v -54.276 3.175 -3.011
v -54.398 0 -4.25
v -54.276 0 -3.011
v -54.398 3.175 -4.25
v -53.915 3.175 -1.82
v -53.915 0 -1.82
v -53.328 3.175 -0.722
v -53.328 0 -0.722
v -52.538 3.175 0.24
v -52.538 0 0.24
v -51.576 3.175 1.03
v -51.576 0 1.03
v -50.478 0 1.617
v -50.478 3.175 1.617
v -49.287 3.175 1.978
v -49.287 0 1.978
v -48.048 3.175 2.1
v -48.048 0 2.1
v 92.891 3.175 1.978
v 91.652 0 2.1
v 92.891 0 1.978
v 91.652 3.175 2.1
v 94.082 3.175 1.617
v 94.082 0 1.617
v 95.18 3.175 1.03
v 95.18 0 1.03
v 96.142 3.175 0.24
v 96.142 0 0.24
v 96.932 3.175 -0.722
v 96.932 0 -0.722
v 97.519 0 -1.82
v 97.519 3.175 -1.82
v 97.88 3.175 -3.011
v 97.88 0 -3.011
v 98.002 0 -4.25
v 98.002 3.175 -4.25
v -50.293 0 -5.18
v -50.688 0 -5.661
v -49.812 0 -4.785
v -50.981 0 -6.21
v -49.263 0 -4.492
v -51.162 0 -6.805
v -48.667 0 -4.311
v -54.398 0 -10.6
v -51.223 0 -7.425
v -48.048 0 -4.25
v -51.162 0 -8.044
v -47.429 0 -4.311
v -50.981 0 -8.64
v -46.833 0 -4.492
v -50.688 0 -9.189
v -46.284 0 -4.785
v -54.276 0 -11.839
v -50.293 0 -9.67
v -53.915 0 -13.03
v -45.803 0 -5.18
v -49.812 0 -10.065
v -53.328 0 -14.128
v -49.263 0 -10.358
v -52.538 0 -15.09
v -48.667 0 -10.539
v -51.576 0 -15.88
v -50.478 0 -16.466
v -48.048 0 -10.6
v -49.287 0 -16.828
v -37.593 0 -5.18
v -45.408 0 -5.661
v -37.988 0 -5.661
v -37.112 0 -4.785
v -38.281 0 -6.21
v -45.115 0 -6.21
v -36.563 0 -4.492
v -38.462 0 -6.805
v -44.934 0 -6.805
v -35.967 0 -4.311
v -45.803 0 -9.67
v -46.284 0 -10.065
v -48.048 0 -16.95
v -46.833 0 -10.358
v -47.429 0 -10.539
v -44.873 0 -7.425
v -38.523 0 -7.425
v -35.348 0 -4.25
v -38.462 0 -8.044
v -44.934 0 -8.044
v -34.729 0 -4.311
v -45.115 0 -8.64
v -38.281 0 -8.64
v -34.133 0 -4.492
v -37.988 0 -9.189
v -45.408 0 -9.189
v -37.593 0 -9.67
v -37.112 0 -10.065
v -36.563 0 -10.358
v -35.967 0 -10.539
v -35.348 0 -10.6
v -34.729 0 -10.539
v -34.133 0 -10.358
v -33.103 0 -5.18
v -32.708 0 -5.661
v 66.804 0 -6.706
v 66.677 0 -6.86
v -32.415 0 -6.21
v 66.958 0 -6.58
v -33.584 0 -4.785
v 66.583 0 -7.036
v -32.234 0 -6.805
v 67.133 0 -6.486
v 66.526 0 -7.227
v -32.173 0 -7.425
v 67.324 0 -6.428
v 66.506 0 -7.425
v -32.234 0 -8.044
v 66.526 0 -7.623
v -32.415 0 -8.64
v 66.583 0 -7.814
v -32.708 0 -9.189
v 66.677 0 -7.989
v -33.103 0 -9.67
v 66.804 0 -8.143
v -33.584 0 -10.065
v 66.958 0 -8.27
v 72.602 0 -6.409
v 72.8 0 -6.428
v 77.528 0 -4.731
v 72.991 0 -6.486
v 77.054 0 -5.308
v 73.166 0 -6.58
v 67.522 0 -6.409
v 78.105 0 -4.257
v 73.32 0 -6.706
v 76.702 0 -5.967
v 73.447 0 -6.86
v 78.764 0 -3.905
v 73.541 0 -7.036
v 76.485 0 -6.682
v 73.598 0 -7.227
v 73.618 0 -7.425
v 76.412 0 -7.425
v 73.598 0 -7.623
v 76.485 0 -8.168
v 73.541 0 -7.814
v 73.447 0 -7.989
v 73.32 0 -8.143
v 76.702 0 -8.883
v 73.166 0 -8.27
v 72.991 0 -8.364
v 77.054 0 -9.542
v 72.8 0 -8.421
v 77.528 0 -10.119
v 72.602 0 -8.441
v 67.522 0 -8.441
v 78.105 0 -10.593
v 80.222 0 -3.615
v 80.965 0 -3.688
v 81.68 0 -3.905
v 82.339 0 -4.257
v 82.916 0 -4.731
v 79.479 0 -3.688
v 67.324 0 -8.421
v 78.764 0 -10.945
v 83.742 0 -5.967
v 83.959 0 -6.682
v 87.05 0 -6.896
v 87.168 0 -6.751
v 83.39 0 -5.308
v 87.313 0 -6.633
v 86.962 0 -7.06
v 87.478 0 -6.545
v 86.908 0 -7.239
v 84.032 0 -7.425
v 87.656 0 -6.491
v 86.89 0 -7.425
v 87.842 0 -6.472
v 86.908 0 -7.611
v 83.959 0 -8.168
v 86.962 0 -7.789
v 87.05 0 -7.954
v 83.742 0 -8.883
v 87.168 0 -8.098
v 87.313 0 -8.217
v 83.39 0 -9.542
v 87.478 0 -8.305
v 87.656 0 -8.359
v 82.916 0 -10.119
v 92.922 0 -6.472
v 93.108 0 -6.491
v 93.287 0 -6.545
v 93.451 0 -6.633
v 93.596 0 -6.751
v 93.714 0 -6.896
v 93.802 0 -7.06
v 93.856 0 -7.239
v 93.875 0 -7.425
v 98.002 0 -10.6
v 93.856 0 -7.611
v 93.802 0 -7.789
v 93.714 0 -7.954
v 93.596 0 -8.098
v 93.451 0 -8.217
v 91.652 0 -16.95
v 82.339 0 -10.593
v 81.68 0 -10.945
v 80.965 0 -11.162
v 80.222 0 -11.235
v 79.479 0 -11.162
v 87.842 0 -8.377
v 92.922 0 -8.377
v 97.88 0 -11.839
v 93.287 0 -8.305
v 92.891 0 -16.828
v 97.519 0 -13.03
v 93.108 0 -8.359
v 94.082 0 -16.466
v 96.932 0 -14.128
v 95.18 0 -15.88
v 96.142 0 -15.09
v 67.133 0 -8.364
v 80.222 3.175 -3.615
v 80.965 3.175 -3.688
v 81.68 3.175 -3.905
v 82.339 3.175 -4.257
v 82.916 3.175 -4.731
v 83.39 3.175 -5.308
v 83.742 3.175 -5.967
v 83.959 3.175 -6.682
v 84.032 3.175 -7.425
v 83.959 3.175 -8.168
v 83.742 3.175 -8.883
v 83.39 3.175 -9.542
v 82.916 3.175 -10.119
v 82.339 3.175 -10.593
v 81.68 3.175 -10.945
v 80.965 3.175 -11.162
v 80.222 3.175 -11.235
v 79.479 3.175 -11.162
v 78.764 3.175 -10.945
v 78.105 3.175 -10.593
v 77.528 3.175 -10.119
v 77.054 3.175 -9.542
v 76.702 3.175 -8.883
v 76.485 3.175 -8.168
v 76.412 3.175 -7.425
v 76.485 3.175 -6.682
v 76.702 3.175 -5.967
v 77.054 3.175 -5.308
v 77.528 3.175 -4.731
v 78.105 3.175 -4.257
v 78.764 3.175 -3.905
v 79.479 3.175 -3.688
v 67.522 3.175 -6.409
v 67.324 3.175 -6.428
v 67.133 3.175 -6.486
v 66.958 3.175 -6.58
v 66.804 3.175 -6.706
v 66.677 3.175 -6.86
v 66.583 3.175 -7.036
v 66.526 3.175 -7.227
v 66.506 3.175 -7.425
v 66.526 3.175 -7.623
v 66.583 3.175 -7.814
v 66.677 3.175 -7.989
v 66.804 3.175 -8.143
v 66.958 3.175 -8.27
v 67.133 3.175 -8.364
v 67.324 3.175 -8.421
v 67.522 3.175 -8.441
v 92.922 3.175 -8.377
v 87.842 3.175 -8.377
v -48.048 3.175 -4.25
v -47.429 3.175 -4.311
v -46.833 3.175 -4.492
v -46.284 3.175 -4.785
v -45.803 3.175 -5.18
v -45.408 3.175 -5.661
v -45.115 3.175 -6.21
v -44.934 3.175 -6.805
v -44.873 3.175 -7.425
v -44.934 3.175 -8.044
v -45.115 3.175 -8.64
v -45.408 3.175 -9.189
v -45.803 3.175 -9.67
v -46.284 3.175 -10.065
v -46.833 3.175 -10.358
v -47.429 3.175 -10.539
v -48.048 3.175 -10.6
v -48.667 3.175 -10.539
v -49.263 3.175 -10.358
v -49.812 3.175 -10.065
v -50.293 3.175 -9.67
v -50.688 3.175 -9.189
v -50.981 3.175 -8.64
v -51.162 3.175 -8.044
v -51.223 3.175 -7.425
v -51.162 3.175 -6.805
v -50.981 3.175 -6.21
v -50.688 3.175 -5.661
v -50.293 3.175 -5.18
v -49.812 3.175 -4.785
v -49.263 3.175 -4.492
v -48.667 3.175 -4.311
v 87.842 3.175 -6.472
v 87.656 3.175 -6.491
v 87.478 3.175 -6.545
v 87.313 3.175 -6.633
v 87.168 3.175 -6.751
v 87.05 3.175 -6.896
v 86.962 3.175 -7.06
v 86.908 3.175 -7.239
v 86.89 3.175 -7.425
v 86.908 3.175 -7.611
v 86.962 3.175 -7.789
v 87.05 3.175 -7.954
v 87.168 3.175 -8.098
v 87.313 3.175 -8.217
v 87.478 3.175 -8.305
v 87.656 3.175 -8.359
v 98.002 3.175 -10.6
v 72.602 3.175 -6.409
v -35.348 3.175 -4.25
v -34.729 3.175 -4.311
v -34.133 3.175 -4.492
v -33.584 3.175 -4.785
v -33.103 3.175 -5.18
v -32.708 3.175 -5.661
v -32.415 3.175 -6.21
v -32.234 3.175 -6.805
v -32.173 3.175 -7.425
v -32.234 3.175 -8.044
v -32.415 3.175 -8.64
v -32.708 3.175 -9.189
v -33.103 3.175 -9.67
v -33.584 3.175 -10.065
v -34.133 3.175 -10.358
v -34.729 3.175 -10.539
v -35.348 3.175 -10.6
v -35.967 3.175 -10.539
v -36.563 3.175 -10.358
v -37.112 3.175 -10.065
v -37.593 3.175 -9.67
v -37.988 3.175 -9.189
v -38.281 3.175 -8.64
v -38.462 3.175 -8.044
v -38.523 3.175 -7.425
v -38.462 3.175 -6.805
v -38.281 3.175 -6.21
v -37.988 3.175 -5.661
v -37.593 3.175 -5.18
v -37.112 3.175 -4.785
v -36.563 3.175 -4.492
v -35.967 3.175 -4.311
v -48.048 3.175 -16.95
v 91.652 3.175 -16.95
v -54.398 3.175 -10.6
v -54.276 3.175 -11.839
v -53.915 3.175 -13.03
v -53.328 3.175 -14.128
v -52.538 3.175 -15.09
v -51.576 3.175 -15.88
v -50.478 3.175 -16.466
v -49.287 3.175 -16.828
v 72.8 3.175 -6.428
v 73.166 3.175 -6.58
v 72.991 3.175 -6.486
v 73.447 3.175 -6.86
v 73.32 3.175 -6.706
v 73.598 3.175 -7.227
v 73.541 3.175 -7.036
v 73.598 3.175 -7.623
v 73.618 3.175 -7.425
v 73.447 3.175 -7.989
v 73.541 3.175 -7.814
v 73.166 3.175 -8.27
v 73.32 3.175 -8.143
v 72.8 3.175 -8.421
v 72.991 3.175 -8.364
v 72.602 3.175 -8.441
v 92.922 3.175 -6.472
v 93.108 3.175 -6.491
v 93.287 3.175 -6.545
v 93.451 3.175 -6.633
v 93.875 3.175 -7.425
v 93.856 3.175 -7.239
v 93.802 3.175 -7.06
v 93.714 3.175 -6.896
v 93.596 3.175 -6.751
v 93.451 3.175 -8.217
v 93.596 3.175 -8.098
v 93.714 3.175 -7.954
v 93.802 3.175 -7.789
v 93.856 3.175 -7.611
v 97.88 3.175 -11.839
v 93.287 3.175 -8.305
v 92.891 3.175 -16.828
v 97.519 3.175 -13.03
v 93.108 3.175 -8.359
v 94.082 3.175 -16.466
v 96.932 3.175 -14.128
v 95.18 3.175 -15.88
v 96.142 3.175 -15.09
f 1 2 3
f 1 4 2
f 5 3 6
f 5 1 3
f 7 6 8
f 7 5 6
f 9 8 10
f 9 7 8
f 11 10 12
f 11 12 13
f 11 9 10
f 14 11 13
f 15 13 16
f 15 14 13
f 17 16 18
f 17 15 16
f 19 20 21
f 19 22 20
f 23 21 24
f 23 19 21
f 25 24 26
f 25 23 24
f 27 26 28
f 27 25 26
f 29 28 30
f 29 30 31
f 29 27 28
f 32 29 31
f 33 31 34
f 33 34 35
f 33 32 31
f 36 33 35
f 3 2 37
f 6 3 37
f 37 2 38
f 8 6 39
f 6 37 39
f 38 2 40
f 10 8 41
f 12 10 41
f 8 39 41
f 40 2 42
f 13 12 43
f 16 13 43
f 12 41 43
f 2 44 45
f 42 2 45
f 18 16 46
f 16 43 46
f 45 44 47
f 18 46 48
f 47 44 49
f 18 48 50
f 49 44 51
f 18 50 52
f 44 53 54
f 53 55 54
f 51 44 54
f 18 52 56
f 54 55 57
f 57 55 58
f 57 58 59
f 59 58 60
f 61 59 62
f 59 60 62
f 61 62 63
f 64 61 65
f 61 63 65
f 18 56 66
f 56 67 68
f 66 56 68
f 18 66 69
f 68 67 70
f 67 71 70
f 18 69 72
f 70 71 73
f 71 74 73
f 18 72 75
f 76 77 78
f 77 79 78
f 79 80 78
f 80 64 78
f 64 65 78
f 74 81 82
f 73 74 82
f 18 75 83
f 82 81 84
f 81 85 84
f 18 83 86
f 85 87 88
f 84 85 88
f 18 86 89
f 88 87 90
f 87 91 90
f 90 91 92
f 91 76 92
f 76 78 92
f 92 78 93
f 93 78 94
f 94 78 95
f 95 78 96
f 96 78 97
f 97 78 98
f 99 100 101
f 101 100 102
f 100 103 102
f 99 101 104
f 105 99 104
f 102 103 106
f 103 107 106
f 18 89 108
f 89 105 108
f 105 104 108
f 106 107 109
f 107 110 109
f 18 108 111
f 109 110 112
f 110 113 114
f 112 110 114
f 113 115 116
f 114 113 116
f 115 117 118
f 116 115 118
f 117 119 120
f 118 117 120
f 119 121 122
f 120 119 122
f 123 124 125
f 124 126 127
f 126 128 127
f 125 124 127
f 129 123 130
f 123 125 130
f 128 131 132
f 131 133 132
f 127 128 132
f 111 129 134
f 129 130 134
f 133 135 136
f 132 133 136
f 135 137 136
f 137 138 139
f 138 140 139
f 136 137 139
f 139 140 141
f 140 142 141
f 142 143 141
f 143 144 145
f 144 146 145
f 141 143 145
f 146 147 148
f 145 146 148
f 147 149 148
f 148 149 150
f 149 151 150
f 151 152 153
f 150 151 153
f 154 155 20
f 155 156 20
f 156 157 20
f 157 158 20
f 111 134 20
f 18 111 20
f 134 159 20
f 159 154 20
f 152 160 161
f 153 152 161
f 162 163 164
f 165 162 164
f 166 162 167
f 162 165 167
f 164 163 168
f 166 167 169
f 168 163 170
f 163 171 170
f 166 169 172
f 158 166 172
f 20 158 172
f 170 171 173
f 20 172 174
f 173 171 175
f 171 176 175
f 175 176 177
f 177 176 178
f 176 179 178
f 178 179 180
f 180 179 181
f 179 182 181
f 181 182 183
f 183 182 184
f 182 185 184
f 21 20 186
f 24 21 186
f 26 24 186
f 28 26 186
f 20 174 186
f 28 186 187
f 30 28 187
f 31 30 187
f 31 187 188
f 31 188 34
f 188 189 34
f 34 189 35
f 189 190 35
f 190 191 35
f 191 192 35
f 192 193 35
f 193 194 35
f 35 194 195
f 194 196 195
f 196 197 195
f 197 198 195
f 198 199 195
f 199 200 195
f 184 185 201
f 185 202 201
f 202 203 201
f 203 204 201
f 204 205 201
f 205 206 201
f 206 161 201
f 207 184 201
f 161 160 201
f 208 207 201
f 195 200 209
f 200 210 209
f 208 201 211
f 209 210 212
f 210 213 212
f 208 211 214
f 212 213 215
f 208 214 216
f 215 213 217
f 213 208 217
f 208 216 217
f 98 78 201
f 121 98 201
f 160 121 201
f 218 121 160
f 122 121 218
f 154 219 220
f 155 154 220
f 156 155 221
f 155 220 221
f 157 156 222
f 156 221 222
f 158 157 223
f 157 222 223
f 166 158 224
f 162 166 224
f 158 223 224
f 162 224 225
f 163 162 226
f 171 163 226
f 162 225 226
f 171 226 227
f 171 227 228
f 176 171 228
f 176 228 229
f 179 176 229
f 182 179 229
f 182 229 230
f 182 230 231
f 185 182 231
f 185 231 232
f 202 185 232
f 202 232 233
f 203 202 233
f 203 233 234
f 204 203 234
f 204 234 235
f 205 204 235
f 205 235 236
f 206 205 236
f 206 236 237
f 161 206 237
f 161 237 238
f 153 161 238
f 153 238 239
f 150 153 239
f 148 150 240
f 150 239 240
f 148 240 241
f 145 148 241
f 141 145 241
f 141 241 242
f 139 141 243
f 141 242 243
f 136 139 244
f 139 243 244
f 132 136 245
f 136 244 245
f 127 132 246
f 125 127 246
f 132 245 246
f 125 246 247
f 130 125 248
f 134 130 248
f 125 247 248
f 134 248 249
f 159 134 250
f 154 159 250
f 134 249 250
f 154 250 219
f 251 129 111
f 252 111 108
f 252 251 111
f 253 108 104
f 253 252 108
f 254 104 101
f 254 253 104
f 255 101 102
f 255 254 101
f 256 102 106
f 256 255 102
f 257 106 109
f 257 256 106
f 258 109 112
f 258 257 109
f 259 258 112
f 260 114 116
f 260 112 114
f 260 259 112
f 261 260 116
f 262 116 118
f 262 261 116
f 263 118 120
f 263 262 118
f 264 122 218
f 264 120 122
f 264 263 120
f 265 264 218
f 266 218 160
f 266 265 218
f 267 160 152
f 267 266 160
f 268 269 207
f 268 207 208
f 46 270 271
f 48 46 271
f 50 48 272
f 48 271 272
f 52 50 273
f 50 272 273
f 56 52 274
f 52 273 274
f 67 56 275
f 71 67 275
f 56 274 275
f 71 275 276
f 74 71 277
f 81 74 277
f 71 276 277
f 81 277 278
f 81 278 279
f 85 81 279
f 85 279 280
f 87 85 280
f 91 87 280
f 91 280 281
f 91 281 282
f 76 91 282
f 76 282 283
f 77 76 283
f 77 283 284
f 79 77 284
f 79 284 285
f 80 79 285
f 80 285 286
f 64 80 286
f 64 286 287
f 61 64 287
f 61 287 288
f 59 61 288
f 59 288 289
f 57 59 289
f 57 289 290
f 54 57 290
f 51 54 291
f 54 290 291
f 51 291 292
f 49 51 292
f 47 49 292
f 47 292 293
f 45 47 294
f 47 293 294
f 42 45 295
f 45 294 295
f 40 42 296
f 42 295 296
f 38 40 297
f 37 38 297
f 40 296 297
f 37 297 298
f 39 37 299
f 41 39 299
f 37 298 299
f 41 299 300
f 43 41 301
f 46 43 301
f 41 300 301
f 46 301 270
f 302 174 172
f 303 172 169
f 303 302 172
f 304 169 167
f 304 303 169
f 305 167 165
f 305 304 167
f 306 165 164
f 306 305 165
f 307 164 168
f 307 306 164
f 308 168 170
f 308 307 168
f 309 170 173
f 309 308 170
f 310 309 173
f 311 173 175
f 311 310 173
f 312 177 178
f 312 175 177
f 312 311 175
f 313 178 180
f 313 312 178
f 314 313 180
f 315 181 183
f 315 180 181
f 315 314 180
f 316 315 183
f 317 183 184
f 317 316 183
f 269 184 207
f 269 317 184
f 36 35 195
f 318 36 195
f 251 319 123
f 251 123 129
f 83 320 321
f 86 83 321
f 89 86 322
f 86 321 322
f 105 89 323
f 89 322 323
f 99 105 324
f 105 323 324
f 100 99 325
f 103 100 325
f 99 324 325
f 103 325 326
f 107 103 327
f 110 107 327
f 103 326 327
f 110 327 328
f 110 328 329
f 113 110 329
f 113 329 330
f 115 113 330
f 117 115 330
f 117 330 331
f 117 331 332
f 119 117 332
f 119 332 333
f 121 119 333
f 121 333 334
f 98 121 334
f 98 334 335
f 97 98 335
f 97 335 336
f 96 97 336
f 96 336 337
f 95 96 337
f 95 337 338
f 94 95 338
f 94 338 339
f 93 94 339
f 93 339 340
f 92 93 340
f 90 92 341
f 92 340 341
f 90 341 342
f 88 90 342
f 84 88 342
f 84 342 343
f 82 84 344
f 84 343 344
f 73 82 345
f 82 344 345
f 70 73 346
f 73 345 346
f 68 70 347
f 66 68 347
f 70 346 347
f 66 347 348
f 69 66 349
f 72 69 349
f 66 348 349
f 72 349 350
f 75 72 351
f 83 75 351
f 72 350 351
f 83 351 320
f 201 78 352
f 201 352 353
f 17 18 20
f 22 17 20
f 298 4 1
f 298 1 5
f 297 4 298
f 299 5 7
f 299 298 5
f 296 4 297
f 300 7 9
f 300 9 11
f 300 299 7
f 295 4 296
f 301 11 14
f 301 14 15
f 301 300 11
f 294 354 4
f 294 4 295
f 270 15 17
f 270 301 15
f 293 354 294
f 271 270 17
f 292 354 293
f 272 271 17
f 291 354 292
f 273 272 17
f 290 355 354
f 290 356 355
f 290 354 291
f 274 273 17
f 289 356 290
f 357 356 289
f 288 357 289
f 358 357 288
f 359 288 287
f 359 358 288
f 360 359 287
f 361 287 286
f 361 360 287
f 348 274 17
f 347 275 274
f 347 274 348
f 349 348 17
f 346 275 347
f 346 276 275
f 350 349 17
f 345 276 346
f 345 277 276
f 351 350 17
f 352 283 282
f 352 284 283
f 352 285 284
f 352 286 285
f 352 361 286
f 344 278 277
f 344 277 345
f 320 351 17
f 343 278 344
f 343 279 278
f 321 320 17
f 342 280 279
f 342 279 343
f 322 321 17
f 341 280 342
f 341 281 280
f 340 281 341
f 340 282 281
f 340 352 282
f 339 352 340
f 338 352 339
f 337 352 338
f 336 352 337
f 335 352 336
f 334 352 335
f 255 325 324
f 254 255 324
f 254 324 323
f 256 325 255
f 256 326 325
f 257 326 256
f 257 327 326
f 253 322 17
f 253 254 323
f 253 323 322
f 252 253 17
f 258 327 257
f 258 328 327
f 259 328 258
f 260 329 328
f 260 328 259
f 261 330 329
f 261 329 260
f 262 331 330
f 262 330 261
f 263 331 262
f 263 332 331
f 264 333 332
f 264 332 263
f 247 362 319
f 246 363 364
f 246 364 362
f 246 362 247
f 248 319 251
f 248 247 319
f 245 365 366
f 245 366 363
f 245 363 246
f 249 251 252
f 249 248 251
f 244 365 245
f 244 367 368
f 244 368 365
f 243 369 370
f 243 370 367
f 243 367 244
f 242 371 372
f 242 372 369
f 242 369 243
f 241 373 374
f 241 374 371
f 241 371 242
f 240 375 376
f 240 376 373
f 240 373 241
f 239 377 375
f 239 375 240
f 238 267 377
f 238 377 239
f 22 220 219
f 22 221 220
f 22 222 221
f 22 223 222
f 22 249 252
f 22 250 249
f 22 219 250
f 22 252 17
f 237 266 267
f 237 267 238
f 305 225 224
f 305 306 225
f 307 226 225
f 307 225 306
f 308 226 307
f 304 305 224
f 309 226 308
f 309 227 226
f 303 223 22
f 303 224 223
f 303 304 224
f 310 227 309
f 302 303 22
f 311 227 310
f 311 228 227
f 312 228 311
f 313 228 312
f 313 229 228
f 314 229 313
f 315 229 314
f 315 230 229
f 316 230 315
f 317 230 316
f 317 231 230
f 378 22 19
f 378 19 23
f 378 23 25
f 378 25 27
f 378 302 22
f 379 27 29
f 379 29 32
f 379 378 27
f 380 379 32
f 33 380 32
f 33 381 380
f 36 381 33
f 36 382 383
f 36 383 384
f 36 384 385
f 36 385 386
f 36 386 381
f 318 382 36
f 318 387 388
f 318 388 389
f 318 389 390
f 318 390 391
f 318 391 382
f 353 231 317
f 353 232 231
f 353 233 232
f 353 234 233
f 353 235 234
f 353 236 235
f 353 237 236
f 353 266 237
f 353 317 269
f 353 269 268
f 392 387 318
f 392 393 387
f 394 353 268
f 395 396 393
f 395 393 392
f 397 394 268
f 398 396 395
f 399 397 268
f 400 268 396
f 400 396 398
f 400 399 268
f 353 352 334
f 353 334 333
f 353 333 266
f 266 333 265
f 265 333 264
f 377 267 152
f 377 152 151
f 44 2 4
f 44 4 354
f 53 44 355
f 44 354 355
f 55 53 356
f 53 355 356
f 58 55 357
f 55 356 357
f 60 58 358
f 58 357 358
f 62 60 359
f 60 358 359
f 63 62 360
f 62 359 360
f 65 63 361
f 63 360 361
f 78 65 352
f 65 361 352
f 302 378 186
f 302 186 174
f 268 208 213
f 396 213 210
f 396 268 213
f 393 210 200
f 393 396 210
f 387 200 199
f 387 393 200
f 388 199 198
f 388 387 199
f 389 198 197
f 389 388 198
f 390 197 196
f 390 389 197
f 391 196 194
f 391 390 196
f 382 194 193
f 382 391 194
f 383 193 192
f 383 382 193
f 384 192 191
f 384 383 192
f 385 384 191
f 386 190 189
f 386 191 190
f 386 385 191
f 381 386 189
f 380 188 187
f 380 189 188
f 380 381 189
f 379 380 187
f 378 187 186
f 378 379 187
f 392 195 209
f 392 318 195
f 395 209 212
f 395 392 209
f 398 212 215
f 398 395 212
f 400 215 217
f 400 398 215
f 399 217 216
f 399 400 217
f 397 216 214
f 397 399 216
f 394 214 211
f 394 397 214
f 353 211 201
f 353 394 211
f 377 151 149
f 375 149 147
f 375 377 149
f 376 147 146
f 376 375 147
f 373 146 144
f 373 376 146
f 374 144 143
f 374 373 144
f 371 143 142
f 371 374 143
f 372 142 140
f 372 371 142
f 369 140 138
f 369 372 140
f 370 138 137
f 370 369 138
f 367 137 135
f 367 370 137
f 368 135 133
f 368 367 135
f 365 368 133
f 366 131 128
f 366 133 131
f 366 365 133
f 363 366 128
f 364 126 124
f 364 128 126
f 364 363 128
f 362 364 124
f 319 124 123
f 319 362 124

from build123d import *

# Parameters (mm, degrees)
SKETCH1_W           = 152.4
SKETCH1_H           = 19.05
BOSS_EXTRUDE1_DEPTH = 3.175
FILLET1_R           = 6.35
SKETCH2_R           = 3.175
SKETCH2_R_2         = 3.81
CUT_EXTRUDE1_DEPTH  = 100.507657605


with BuildPart() as part:
    # Sketch1 → Boss-Extrude1 (new body)
    with BuildSketch(Plane(origin=(0, 0, 0), x_dir=(1, 0, 0), z_dir=(0, 1, 0))):
        with Locations((21.802018925, 7.424854969)):
            Rectangle(SKETCH1_W, SKETCH1_H)
    extrude(amount=BOSS_EXTRUDE1_DEPTH)

    # Fillet1
    fillet1_edges = [part.edges().sort_by_distance(p)[0] for p in [
        (-54.397981075, 1.5875, -16.949854969),
        (98.002018925, 1.5875, -16.949854969),
        (98.002018925, 1.5875, 2.100145031),
        (-54.397981075, 1.5875, 2.100145031),
    ]]
    fillet(fillet1_edges, radius=FILLET1_R)

    # Sketch2 → Cut-Extrude1 (cut, through all)
    with BuildSketch(Plane(origin=(0, 3.175, 0), x_dir=(1, 0, 0), z_dir=(0, 1, 0))):
        with Locations(Location((-48.047981075, 7.424854969, 0), (0, 0, 270))):
            Circle(SKETCH2_R)
        with Locations(Location((-35.347981075, 7.424854969, 0), (0, 0, 270))):
            Circle(SKETCH2_R)
        with Locations(Location((80.222018925, 7.424854969, 0), (0, 0, 270))):
            Circle(SKETCH2_R_2)
        with BuildLine():
            Line((87.842018925, 8.377354969), (92.922018925, 8.377354969))
            ThreePointArc((92.922018925, 8.377354969), (93.874518925, 7.424854969), (92.922018925, 6.472354969))
            Line((92.922018925, 6.472354969), (87.842018925, 6.472354969))
            ThreePointArc((87.842018925, 6.472354969), (86.889518925, 7.424854969), (87.842018925, 8.377354969))
        make_face()
        with BuildLine():
            Line((72.602018925, 6.408854969), (67.522018925, 6.408854969))
            ThreePointArc((67.522018925, 6.408854969), (66.506018925, 7.424854969), (67.522018925, 8.440854969))
            Line((67.522018925, 8.440854969), (72.602018925, 8.440854969))
            ThreePointArc((72.602018925, 8.440854969), (73.618018925, 7.424854969), (72.602018925, 6.408854969))
        make_face()
    extrude(amount=-CUT_EXTRUDE1_DEPTH, mode=Mode.SUBTRACT)


solid = part.part
